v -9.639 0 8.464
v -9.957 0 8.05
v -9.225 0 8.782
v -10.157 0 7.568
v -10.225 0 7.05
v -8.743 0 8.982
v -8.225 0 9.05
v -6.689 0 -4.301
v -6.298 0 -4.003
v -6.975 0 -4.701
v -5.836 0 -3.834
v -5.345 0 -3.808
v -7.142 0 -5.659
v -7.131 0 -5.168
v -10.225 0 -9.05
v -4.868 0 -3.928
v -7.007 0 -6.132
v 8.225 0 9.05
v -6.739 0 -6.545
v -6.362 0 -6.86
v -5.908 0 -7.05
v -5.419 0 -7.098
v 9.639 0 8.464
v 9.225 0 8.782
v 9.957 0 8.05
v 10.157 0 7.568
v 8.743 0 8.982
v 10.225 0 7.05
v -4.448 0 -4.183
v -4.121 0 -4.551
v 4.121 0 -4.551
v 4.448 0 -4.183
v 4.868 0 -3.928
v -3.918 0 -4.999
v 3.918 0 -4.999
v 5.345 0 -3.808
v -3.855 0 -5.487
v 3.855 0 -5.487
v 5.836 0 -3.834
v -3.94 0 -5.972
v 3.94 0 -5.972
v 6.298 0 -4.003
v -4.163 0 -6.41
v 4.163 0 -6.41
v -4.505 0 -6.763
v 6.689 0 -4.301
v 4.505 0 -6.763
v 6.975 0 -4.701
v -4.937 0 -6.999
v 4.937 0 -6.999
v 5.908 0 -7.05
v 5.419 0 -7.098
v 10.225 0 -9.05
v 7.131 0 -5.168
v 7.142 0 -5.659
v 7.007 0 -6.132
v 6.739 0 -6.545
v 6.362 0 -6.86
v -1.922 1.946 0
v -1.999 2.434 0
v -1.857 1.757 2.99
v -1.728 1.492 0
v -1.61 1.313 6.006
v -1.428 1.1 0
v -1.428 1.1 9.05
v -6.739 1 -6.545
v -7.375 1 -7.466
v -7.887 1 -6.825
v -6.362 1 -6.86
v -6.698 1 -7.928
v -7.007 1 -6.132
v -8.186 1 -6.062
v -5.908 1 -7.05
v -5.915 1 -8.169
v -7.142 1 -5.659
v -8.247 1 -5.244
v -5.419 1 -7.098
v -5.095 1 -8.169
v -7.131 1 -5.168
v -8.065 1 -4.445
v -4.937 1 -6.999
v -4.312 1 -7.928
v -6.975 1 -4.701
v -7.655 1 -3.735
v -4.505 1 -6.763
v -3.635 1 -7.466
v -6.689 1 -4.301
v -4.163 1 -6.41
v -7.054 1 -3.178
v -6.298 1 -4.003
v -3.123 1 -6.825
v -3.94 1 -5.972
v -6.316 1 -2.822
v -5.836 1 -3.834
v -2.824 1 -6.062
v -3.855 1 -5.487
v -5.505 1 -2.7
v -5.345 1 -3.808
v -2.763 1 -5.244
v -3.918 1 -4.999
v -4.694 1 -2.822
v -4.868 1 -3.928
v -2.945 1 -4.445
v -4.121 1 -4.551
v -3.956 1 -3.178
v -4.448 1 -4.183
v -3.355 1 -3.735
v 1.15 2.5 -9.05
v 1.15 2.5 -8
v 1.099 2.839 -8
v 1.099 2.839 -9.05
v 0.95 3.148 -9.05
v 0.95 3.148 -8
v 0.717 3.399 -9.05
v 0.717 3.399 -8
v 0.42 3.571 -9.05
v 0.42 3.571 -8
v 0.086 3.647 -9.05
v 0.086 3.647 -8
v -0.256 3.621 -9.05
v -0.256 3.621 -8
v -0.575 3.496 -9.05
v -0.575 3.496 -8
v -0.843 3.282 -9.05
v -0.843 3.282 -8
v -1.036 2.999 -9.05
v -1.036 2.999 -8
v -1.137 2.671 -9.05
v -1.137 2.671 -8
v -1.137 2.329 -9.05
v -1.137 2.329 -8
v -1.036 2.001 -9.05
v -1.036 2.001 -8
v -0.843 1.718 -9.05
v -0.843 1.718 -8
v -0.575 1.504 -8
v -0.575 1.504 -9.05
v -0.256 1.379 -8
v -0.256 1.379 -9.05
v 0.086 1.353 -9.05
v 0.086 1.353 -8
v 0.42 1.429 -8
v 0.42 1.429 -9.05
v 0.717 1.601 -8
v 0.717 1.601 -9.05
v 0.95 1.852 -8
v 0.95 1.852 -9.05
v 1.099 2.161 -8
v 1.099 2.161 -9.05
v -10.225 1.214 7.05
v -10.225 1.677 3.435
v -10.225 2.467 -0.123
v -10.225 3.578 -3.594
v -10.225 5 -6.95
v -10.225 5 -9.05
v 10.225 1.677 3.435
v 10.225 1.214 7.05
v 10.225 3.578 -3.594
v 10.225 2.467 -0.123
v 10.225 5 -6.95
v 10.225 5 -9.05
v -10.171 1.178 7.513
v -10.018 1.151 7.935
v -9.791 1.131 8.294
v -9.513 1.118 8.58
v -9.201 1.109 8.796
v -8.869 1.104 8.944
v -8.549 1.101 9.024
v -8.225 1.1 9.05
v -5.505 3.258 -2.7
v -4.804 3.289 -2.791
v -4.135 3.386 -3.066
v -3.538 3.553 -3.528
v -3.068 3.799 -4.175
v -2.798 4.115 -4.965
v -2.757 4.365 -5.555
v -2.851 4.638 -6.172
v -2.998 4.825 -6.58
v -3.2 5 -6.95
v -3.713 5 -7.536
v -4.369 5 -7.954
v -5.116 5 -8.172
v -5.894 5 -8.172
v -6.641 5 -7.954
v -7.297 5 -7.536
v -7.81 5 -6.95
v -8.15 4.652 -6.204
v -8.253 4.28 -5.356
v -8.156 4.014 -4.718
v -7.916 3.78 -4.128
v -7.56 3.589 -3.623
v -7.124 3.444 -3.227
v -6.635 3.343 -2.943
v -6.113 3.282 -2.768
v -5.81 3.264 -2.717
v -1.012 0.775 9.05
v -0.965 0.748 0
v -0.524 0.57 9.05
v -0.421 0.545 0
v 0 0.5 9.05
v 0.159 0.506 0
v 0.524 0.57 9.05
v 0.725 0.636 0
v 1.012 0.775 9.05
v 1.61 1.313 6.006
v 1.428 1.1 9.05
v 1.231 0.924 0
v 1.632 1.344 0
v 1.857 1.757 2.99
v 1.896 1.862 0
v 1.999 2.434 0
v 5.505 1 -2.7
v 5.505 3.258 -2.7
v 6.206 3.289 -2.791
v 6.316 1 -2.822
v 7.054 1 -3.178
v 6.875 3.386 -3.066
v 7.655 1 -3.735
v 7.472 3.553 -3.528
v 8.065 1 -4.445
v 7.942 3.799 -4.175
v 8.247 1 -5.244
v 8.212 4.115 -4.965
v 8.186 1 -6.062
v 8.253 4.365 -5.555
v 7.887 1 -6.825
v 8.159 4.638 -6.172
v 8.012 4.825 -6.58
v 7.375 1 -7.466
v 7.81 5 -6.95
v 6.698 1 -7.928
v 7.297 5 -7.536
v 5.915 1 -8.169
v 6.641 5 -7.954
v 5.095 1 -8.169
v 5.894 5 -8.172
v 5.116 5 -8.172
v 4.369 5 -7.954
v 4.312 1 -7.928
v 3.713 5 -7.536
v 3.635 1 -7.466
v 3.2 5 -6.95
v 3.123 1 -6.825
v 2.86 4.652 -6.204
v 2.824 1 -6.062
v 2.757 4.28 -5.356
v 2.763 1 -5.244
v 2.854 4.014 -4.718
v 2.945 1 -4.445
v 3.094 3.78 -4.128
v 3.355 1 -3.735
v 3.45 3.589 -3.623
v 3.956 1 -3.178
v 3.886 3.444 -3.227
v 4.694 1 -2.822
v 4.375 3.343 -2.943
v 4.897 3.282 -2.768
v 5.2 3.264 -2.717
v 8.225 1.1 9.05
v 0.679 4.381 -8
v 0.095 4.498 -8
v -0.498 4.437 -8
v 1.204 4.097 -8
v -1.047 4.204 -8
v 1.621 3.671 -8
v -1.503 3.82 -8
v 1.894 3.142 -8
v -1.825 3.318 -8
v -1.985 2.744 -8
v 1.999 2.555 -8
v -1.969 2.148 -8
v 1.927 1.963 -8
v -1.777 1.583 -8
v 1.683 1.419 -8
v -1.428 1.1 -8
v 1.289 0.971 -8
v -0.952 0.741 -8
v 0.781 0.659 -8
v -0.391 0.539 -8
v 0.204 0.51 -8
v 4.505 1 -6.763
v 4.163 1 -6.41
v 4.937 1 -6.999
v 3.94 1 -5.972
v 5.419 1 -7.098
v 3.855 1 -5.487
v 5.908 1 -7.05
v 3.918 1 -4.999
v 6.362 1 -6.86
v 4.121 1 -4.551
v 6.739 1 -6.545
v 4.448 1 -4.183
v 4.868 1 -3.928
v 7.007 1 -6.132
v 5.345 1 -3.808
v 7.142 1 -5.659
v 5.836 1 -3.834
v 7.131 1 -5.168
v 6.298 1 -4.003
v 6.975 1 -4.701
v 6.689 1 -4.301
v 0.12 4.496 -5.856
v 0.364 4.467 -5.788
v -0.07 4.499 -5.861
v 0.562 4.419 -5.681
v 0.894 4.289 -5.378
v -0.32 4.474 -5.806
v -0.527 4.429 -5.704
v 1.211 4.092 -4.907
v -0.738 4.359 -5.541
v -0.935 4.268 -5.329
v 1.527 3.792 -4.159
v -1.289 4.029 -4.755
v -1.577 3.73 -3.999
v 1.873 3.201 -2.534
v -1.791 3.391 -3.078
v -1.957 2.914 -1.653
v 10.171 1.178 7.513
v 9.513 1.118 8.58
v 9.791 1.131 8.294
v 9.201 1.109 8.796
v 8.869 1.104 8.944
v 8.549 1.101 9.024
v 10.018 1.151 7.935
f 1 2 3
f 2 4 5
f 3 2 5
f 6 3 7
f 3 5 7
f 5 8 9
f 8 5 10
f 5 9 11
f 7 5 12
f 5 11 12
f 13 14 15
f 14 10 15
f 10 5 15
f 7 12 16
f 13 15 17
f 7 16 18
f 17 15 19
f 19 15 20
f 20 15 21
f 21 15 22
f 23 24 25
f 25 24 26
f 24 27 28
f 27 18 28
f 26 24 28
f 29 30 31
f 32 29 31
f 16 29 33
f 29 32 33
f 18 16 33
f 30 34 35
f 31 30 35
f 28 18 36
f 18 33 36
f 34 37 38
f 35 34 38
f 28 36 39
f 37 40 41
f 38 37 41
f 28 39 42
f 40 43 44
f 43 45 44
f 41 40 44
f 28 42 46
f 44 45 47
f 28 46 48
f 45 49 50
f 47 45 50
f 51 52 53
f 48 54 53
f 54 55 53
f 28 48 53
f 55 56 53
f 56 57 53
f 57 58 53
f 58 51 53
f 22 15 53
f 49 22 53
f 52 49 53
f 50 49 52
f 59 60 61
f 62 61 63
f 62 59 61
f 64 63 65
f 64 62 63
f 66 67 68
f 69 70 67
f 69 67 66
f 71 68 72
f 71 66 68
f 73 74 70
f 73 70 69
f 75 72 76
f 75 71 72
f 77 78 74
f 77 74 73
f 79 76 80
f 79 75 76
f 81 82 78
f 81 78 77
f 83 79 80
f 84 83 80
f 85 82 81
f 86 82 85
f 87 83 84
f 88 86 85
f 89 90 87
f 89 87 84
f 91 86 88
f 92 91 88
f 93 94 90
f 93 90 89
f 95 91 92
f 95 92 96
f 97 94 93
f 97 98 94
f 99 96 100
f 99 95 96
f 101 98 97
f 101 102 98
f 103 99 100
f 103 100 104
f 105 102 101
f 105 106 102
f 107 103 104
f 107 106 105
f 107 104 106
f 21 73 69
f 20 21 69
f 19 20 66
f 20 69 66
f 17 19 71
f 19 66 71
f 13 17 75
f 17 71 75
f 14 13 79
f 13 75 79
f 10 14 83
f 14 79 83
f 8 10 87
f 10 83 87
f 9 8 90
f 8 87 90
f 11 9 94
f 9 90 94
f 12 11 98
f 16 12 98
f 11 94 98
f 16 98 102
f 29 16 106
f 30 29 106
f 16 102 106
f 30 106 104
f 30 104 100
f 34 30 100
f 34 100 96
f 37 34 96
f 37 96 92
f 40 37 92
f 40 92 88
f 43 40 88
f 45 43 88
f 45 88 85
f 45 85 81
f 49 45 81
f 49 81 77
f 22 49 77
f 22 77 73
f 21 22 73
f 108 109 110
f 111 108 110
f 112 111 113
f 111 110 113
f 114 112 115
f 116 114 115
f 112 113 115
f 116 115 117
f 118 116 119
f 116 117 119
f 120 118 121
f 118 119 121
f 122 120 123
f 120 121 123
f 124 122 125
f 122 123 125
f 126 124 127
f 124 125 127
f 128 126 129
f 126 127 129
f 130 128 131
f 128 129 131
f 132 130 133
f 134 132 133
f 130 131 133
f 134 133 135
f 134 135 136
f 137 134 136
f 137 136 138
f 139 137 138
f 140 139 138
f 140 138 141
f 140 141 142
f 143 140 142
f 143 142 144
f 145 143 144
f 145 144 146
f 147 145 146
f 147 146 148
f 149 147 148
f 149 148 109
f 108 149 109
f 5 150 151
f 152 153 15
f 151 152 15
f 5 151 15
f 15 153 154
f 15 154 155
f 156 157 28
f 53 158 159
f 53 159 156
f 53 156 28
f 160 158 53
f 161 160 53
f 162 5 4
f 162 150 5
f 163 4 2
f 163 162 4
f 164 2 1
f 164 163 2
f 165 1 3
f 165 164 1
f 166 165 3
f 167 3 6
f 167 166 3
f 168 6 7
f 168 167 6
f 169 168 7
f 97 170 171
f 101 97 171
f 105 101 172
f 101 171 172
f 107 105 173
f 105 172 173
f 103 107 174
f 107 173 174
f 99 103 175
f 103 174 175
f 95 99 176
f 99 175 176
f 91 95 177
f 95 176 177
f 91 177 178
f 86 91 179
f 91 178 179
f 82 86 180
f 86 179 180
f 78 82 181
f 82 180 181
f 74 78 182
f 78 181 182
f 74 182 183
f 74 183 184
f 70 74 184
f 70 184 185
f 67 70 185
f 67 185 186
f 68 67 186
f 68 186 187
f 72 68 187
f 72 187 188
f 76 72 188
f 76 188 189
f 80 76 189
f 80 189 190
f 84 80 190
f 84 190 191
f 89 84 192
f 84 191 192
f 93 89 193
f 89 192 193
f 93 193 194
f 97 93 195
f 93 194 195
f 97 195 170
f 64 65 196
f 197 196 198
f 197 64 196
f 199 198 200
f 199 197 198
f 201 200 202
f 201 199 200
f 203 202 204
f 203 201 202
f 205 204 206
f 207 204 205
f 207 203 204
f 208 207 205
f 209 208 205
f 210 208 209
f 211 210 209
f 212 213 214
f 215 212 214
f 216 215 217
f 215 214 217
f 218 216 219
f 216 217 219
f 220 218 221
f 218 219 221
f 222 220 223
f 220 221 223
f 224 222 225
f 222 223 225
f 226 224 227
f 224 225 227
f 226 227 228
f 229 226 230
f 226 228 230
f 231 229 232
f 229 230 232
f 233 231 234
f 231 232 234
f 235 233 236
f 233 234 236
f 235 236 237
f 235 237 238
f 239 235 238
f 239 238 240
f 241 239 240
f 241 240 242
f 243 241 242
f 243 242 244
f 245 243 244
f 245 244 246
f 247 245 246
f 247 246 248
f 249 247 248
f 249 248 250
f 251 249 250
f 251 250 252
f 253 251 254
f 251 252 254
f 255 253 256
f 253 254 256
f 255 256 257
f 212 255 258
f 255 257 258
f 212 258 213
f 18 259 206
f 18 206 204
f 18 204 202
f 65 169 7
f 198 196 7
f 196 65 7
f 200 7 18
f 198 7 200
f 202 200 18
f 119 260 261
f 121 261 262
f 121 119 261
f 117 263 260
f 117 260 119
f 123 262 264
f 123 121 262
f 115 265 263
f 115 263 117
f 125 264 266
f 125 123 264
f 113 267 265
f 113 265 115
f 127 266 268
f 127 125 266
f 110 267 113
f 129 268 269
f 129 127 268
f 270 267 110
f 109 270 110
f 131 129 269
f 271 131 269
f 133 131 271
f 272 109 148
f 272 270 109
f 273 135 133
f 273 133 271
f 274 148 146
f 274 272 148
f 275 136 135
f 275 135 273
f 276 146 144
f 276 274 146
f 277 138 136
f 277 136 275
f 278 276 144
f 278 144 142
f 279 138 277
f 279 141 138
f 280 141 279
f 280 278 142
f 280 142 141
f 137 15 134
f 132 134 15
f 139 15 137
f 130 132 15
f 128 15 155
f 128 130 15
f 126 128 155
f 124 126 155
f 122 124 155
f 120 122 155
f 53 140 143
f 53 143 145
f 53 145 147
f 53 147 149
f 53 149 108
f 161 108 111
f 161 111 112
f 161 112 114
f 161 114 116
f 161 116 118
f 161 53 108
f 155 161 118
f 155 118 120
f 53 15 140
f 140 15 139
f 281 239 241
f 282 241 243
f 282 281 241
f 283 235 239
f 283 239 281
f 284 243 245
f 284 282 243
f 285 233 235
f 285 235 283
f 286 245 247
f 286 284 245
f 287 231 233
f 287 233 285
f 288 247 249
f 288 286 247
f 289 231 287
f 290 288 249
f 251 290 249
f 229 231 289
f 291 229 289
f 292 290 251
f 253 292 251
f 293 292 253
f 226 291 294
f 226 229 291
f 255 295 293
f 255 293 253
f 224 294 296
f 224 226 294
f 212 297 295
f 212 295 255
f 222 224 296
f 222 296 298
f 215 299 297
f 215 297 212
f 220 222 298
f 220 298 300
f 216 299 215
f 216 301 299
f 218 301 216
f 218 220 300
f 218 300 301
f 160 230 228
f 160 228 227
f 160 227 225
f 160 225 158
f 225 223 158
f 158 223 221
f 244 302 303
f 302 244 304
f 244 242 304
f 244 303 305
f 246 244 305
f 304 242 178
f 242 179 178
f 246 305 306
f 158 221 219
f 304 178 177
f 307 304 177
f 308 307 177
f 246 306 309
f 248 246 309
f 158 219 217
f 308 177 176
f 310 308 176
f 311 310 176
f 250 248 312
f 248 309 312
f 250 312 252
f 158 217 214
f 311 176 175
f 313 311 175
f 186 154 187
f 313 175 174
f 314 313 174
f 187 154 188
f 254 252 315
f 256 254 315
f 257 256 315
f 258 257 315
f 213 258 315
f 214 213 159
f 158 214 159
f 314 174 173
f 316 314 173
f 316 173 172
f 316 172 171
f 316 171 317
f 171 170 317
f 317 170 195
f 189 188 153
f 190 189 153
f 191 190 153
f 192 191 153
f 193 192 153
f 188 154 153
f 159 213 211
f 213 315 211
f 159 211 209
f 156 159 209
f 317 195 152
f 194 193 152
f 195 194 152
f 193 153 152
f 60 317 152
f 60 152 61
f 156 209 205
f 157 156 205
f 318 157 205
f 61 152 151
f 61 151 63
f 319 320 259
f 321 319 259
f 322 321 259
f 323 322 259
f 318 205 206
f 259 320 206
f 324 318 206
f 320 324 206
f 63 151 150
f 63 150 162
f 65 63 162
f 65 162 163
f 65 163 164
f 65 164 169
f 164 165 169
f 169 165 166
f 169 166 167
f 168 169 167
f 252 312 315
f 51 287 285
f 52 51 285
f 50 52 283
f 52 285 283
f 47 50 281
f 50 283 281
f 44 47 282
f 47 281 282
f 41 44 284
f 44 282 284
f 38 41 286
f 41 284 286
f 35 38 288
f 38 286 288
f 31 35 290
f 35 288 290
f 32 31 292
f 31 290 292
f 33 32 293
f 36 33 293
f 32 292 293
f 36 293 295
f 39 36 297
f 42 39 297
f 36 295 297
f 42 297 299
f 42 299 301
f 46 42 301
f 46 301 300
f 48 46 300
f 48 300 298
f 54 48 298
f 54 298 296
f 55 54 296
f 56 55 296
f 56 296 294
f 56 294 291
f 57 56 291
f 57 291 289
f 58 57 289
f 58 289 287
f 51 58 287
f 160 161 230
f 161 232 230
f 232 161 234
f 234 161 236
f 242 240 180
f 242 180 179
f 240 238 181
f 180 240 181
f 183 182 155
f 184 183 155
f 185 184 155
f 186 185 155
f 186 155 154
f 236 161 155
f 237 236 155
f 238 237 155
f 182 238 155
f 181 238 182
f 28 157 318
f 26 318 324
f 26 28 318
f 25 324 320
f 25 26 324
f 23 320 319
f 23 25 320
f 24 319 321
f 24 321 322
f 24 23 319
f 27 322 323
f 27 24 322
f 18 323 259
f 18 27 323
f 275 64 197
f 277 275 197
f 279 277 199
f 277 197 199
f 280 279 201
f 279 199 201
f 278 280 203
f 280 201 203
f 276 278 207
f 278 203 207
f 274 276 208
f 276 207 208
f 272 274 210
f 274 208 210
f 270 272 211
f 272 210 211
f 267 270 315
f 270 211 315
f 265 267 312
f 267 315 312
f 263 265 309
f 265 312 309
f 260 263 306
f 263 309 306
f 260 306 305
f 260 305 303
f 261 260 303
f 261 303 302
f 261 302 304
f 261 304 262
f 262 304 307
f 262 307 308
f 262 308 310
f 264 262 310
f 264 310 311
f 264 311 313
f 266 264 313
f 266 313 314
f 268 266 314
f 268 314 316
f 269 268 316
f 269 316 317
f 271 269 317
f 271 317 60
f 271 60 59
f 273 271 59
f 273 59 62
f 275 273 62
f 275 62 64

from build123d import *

# Parameters (mm, degrees)
SKETCH1_W                       = 20.45
SKETCH1_H                       = 18.1
BOSS_EXTRUDE2_DEPTH             = 1
BOSS_EXTRUDE3_REACH             = 15.691
BOSS_EXTRUDE3_DIRECTION_2_REACH = 15.691
SKETCH4_R                       = 1.65
CUT_EXTRUDE1_DEPTH              = 5
BOSS_EXTRUDE5_START             = -10.225
BOSS_EXTRUDE5_DEPTH             = 20.45
SKETCH6_R                       = 2.75
CUT_EXTRUDE2_DEPTH              = 4
SKETCH7_R                       = 1.15
CUT_EXTRUDE3_DEPTH              = 9.05
SKETCH8_R                       = 2
CUT_EXTRUDE4_DEPTH              = 8
CUT_EXTRUDE4_DIRECTION_2_REACH  = 16.541
FILLET1_R                       = 2


with BuildPart() as part:
    # Sketch1 → Boss-Extrude2 (new body)
    with BuildSketch(Plane(origin=(0, 0, 0), x_dir=(1, 0, 0), z_dir=(0, 1, 0))):
        Rectangle(SKETCH1_W, SKETCH1_H)
    extrude(amount=BOSS_EXTRUDE2_DEPTH)

    # Boss-Extrude3: up to this face of the body (flat: up to its plane)
    boss_extrude3_end = Plane(part.part.faces().sort_by_distance((10.225, 0.5, 0))[0])
    # Sketch3 → Boss-Extrude3 (add, up to the picked face)
    with BuildSketch(Plane(origin=(0, 0, 0), x_dir=(0, 0, -1), z_dir=(1, 0, 0)), mode=Mode.PRIVATE) as boss_extrude3_sk1:
        Polygon((9.05, 1), (9.05, 5), (7.05, 5), (3.05, 1), align=None)
    boss_extrude3_tool1 = split(extrude(boss_extrude3_sk1.sketch, amount=BOSS_EXTRUDE3_REACH, mode=Mode.PRIVATE), bisect_by=boss_extrude3_end, keep=Keep.BOTH, mode=Mode.PRIVATE)
    add(boss_extrude3_tool1.solids().sort_by(Axis((0, 2.666667, -6.883333), (1, 0, 0)))[0])

    # Boss-Extrude3 direction 2: up to this face of the body (flat: up to its plane)
    boss_extrude3_direction_2_end = Plane(part.part.faces().sort_by_distance((-10.225, 0.5, 0))[0])
    # Sketch3 → Boss-Extrude3 direction 2 (add, up to the picked face)
    with BuildSketch(Plane(origin=(0, 0, 0), x_dir=(0, 0, -1), z_dir=(1, 0, 0)), mode=Mode.PRIVATE) as boss_extrude3_direction_2_sk1:
        Polygon((9.05, 1), (9.05, 5), (7.05, 5), (3.05, 1), align=None)
    boss_extrude3_direction_2_tool1 = split(extrude(boss_extrude3_direction_2_sk1.sketch, amount=-BOSS_EXTRUDE3_DIRECTION_2_REACH, mode=Mode.PRIVATE), bisect_by=boss_extrude3_direction_2_end, keep=Keep.BOTH, mode=Mode.PRIVATE)
    add(boss_extrude3_direction_2_tool1.solids().sort_by(Axis((0, 2.666667, -6.883333), (-1, 0, 0)))[0])

    # Sketch4 → Cut-Extrude1 (cut)
    with BuildSketch(Plane(origin=(0, 5, 0), x_dir=(1, 0, 0), z_dir=(0, 1, 0))):
        with Locations(Location((-5.505, 5.45, 0), (0, 0, 104.141110234))):
            Circle(SKETCH4_R)
        with Locations(Location((5.505, 5.45, 0), (0, 0, 75.858889766))):
            Circle(SKETCH4_R)
    extrude(amount=-CUT_EXTRUDE1_DEPTH, mode=Mode.SUBTRACT)

    # Sketch10 → Boss-Extrude5 (add)
    with BuildSketch(Plane(origin=(0, 0, 0), x_dir=(0, 0, -1), z_dir=(1, 0, 0)).offset(BOSS_EXTRUDE5_START)):
        with BuildLine():
            Line((3.05, 1), (7.05, 5))
            Line((7.05, 5), (6.95, 5))
            ThreePointArc((6.95, 5), (-0.847118083, 2.217663929), (-9.05, 1.1))
            Line((-9.05, 1.1), (-9.05, 1))
            Line((-9.05, 1), (3.05, 1))
        make_face()
    extrude(amount=BOSS_EXTRUDE5_DEPTH)

    # Sketch6 → Cut-Extrude2 (cut)
    with BuildSketch(Plane(origin=(0, 5, 0), x_dir=(1, 0, 0), z_dir=(0, 1, 0))):
        with Locations(Location((-5.505, 5.45, 0), (0, 0, 270))):
            Circle(SKETCH6_R)
        with Locations(Location((5.505, 5.45, 0), (0, 0, 270))):
            Circle(SKETCH6_R)
    extrude(amount=-CUT_EXTRUDE2_DEPTH, mode=Mode.SUBTRACT)

    # Sketch7 → Cut-Extrude3 (cut)
    with BuildSketch(Plane.XY):
        with Locations((0, 2.5)):
            Circle(SKETCH7_R)
    extrude(amount=-CUT_EXTRUDE3_DEPTH, mode=Mode.SUBTRACT)

    # Sketch8 → Cut-Extrude4 (cut)
    with BuildSketch(Plane.XY):
        with Locations(Location((0, 2.5, 0), (0, 0, 224.427004001))):
            Circle(SKETCH8_R)
    extrude(amount=-CUT_EXTRUDE4_DEPTH, mode=Mode.SUBTRACT)

    # Cut-Extrude4 direction 2: up to this face of the body (flat: up to its plane)
    cut_extrude4_direction_2_end = Plane(part.part.faces().sort_by_distance((0, 0.55, 9.05))[0])
    # Sketch8 → Cut-Extrude4 direction 2 (cut, up to the picked face)
    with BuildSketch(Plane.XY, mode=Mode.PRIVATE) as cut_extrude4_direction_2_sk1:
        with Locations(Location((0, 2.5, 0), (0, 0, 224.427004001))):
            Circle(SKETCH8_R)
    cut_extrude4_direction_2_tool1 = split(extrude(cut_extrude4_direction_2_sk1.sketch, amount=CUT_EXTRUDE4_DIRECTION_2_REACH, mode=Mode.PRIVATE), bisect_by=cut_extrude4_direction_2_end, keep=Keep.BOTH, mode=Mode.PRIVATE)
    add(cut_extrude4_direction_2_tool1.solids().sort_by(Axis((0, 2.5, 0), (0, 0, 1)))[0], mode=Mode.SUBTRACT)

    # Fillet1
    fillet1_edges = [part.edges().sort_by_distance(p)[0] for p in [
        (10.225, 0.55, 9.05),
        (-10.225, 0.55, 9.05),
    ]]
    fillet(fillet1_edges, radius=FILLET1_R)


solid = part.part
